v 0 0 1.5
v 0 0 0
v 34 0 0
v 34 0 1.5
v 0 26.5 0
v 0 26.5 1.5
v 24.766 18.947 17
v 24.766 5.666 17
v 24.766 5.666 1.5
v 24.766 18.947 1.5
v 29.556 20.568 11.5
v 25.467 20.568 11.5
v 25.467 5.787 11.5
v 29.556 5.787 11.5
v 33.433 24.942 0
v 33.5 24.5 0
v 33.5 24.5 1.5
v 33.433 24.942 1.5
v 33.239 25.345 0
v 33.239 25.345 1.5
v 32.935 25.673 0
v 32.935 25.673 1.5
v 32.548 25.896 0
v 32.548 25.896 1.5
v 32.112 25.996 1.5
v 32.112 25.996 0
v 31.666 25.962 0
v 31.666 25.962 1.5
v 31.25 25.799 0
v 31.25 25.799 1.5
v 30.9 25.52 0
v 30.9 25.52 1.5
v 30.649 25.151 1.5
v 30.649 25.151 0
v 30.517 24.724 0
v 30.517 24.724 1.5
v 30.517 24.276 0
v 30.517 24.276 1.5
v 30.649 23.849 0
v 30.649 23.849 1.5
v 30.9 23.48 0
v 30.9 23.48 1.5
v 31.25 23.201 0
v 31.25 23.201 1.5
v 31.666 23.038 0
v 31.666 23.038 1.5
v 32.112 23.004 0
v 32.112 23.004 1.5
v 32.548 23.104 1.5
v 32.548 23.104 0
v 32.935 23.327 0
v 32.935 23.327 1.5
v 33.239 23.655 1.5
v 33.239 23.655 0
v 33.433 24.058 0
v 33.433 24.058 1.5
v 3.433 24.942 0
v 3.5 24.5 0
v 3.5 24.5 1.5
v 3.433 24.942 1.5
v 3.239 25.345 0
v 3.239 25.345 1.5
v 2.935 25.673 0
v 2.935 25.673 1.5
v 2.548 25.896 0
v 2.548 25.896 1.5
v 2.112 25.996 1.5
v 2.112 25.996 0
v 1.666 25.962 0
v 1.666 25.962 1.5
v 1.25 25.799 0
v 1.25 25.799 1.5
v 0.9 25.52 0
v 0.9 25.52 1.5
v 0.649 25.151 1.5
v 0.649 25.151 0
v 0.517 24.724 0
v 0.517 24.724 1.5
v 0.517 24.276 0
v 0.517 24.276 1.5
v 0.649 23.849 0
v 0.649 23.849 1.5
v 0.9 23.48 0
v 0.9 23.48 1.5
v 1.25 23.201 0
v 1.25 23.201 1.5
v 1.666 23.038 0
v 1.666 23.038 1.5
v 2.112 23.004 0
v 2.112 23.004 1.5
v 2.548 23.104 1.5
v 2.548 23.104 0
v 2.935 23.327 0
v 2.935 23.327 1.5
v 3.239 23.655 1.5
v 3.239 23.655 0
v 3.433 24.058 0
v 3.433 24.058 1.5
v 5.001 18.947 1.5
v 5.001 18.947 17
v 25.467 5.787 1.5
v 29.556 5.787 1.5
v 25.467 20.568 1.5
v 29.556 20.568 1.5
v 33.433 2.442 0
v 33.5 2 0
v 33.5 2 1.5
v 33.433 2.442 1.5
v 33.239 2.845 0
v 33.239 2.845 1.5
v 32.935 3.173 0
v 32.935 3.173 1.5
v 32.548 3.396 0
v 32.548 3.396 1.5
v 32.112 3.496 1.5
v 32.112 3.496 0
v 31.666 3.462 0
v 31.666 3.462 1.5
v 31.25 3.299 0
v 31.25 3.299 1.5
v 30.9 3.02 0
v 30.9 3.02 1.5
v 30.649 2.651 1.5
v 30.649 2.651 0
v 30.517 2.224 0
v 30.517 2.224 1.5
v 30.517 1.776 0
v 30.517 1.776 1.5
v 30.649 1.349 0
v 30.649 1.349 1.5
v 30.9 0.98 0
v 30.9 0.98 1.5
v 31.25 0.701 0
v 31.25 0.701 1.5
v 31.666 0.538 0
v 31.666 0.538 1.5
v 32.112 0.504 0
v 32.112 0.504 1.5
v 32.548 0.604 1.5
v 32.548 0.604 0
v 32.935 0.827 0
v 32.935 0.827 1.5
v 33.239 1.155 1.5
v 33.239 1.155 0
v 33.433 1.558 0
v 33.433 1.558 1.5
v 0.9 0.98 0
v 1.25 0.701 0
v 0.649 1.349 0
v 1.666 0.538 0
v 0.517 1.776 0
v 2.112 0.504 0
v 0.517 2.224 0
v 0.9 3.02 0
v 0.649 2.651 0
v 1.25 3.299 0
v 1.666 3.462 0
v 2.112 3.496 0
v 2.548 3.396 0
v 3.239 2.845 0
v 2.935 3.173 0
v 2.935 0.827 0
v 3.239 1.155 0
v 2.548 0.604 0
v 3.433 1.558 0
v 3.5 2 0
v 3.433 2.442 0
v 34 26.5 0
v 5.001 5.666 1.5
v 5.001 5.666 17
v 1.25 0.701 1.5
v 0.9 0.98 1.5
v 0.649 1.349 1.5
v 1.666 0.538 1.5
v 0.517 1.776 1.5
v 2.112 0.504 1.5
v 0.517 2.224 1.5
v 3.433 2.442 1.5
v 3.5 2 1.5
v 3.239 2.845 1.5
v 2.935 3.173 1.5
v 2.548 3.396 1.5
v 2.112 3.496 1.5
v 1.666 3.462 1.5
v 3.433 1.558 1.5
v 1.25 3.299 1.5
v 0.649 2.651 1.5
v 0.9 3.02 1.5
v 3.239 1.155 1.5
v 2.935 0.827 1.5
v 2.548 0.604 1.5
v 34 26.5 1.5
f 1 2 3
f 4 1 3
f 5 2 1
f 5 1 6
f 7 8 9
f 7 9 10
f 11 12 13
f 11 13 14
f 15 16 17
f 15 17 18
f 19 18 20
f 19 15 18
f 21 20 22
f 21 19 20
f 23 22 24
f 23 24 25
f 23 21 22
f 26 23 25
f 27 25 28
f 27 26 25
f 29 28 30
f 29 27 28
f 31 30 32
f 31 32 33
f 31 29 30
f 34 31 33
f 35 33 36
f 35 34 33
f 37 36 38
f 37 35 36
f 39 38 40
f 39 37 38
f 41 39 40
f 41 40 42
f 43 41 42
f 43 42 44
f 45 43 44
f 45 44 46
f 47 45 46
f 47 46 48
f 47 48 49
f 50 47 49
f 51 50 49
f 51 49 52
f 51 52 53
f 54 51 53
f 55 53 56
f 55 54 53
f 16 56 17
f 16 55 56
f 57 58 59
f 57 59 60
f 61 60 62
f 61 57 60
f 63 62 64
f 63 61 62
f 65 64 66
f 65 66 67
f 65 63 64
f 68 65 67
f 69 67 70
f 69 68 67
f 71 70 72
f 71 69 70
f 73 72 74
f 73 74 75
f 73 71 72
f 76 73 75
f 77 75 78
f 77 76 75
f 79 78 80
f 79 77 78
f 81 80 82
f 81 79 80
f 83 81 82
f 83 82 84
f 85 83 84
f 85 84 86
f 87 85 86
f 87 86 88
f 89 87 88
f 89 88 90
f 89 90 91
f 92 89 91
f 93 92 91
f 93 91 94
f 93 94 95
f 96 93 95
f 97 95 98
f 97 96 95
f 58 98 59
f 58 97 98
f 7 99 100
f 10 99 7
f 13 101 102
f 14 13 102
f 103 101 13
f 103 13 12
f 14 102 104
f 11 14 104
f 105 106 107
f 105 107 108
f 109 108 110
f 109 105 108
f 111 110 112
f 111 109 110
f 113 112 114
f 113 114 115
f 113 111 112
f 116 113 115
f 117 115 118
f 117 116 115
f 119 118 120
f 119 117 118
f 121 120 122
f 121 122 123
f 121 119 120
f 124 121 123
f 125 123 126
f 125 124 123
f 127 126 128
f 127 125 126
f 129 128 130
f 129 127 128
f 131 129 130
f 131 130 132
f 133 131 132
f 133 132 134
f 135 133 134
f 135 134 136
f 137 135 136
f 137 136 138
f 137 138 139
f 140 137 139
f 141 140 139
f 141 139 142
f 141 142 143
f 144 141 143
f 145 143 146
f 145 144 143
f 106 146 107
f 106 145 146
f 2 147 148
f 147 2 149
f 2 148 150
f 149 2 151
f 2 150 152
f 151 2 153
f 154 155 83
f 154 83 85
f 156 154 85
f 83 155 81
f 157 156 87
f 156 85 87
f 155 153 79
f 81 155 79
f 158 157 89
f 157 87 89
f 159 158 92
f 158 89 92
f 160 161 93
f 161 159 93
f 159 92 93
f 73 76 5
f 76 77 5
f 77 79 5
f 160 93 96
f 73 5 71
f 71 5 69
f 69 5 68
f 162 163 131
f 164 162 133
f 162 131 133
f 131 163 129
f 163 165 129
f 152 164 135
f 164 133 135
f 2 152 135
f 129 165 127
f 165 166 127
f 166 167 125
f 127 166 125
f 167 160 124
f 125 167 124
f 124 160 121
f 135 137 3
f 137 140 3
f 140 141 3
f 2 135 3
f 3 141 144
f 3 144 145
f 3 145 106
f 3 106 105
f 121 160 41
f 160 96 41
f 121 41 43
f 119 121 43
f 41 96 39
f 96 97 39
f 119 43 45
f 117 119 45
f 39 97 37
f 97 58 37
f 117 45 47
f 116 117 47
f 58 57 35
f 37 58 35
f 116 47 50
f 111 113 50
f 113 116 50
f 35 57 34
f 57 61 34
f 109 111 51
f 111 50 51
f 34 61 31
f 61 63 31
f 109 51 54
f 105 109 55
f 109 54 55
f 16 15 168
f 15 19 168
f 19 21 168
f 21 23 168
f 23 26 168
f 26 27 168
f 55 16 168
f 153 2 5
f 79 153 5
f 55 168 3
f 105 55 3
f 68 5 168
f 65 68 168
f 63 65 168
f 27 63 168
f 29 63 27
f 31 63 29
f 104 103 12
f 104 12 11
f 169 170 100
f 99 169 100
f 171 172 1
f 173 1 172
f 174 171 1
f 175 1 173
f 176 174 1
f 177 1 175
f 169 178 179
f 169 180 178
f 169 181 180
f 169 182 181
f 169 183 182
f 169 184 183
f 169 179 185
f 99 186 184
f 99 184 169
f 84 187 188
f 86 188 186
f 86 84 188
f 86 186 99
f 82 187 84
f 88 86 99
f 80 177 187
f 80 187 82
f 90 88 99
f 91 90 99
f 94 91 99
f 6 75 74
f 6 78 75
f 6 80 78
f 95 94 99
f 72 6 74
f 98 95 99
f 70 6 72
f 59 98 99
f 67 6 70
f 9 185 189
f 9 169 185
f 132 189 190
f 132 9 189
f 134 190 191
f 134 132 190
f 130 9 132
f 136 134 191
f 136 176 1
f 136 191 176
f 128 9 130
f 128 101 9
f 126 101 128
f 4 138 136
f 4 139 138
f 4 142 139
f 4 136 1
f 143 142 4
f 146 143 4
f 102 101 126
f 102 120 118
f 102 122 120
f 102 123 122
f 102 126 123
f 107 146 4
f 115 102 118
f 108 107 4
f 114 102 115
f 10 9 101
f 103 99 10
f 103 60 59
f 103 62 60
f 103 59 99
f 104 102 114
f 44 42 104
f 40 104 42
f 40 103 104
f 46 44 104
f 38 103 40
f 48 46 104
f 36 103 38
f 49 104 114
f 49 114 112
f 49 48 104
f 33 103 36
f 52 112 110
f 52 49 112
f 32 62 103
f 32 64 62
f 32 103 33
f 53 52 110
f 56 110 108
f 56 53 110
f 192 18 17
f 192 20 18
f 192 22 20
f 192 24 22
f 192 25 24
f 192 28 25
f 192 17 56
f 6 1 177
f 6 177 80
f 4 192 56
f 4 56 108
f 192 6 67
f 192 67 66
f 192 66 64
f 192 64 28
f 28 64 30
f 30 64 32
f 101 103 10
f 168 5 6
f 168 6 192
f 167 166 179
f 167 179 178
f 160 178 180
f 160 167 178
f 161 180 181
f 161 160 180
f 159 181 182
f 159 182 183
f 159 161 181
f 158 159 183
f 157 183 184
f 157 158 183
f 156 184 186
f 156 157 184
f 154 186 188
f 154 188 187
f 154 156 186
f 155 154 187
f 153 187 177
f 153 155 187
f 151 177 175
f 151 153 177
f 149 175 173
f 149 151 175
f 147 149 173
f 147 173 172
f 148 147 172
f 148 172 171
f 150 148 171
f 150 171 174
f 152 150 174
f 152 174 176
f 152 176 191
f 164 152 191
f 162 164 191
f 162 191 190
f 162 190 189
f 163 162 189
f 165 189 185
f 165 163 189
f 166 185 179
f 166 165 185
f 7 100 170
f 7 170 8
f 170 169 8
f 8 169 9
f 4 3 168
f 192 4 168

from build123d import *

# Parameters (mm, degrees)
SKETCH1_W           = 34
SKETCH1_H           = 26.5
SKETCH1_R           = 1.5
BOSS_EXTRUDE1_DEPTH = 1.5
SKETCH2_W           = 19.764821035
SKETCH2_H           = 13.28137913
BOSS_EXTRUDE2_DEPTH = 15.5
SKETCH3_W           = 4.088439113
SKETCH3_H           = 14.781279869
BOSS_EXTRUDE3_DEPTH = 10


with BuildPart() as part:
    # Sketch1 → Boss-Extrude1 (new body)
    with BuildSketch(Plane.XY):
        with Locations((17, 13.25)):
            Rectangle(SKETCH1_W, SKETCH1_H)
        with Locations((2, 24.5)):
            Circle(SKETCH1_R, mode=Mode.SUBTRACT)
        with Locations((32, 24.5)):
            Circle(SKETCH1_R, mode=Mode.SUBTRACT)
        with Locations((2, 2)):
            Circle(SKETCH1_R, mode=Mode.SUBTRACT)
        with Locations((32, 2)):
            Circle(SKETCH1_R, mode=Mode.SUBTRACT)
    extrude(amount=BOSS_EXTRUDE1_DEPTH)

    # Sketch2 → Boss-Extrude2 (add)
    with BuildSketch(Plane.XY.offset(1.5)):
        with Locations((14.883204602, 12.306514051)):
            Rectangle(SKETCH2_W, SKETCH2_H)
    extrude(amount=BOSS_EXTRUDE2_DEPTH)

    # Sketch3 → Boss-Extrude3 (add)
    with BuildSketch(Plane.XY.offset(1.5)):
        with Locations((27.511401151, 13.177424158)):
            Rectangle(SKETCH3_W, SKETCH3_H)
    extrude(amount=BOSS_EXTRUDE3_DEPTH)


solid = part.part
